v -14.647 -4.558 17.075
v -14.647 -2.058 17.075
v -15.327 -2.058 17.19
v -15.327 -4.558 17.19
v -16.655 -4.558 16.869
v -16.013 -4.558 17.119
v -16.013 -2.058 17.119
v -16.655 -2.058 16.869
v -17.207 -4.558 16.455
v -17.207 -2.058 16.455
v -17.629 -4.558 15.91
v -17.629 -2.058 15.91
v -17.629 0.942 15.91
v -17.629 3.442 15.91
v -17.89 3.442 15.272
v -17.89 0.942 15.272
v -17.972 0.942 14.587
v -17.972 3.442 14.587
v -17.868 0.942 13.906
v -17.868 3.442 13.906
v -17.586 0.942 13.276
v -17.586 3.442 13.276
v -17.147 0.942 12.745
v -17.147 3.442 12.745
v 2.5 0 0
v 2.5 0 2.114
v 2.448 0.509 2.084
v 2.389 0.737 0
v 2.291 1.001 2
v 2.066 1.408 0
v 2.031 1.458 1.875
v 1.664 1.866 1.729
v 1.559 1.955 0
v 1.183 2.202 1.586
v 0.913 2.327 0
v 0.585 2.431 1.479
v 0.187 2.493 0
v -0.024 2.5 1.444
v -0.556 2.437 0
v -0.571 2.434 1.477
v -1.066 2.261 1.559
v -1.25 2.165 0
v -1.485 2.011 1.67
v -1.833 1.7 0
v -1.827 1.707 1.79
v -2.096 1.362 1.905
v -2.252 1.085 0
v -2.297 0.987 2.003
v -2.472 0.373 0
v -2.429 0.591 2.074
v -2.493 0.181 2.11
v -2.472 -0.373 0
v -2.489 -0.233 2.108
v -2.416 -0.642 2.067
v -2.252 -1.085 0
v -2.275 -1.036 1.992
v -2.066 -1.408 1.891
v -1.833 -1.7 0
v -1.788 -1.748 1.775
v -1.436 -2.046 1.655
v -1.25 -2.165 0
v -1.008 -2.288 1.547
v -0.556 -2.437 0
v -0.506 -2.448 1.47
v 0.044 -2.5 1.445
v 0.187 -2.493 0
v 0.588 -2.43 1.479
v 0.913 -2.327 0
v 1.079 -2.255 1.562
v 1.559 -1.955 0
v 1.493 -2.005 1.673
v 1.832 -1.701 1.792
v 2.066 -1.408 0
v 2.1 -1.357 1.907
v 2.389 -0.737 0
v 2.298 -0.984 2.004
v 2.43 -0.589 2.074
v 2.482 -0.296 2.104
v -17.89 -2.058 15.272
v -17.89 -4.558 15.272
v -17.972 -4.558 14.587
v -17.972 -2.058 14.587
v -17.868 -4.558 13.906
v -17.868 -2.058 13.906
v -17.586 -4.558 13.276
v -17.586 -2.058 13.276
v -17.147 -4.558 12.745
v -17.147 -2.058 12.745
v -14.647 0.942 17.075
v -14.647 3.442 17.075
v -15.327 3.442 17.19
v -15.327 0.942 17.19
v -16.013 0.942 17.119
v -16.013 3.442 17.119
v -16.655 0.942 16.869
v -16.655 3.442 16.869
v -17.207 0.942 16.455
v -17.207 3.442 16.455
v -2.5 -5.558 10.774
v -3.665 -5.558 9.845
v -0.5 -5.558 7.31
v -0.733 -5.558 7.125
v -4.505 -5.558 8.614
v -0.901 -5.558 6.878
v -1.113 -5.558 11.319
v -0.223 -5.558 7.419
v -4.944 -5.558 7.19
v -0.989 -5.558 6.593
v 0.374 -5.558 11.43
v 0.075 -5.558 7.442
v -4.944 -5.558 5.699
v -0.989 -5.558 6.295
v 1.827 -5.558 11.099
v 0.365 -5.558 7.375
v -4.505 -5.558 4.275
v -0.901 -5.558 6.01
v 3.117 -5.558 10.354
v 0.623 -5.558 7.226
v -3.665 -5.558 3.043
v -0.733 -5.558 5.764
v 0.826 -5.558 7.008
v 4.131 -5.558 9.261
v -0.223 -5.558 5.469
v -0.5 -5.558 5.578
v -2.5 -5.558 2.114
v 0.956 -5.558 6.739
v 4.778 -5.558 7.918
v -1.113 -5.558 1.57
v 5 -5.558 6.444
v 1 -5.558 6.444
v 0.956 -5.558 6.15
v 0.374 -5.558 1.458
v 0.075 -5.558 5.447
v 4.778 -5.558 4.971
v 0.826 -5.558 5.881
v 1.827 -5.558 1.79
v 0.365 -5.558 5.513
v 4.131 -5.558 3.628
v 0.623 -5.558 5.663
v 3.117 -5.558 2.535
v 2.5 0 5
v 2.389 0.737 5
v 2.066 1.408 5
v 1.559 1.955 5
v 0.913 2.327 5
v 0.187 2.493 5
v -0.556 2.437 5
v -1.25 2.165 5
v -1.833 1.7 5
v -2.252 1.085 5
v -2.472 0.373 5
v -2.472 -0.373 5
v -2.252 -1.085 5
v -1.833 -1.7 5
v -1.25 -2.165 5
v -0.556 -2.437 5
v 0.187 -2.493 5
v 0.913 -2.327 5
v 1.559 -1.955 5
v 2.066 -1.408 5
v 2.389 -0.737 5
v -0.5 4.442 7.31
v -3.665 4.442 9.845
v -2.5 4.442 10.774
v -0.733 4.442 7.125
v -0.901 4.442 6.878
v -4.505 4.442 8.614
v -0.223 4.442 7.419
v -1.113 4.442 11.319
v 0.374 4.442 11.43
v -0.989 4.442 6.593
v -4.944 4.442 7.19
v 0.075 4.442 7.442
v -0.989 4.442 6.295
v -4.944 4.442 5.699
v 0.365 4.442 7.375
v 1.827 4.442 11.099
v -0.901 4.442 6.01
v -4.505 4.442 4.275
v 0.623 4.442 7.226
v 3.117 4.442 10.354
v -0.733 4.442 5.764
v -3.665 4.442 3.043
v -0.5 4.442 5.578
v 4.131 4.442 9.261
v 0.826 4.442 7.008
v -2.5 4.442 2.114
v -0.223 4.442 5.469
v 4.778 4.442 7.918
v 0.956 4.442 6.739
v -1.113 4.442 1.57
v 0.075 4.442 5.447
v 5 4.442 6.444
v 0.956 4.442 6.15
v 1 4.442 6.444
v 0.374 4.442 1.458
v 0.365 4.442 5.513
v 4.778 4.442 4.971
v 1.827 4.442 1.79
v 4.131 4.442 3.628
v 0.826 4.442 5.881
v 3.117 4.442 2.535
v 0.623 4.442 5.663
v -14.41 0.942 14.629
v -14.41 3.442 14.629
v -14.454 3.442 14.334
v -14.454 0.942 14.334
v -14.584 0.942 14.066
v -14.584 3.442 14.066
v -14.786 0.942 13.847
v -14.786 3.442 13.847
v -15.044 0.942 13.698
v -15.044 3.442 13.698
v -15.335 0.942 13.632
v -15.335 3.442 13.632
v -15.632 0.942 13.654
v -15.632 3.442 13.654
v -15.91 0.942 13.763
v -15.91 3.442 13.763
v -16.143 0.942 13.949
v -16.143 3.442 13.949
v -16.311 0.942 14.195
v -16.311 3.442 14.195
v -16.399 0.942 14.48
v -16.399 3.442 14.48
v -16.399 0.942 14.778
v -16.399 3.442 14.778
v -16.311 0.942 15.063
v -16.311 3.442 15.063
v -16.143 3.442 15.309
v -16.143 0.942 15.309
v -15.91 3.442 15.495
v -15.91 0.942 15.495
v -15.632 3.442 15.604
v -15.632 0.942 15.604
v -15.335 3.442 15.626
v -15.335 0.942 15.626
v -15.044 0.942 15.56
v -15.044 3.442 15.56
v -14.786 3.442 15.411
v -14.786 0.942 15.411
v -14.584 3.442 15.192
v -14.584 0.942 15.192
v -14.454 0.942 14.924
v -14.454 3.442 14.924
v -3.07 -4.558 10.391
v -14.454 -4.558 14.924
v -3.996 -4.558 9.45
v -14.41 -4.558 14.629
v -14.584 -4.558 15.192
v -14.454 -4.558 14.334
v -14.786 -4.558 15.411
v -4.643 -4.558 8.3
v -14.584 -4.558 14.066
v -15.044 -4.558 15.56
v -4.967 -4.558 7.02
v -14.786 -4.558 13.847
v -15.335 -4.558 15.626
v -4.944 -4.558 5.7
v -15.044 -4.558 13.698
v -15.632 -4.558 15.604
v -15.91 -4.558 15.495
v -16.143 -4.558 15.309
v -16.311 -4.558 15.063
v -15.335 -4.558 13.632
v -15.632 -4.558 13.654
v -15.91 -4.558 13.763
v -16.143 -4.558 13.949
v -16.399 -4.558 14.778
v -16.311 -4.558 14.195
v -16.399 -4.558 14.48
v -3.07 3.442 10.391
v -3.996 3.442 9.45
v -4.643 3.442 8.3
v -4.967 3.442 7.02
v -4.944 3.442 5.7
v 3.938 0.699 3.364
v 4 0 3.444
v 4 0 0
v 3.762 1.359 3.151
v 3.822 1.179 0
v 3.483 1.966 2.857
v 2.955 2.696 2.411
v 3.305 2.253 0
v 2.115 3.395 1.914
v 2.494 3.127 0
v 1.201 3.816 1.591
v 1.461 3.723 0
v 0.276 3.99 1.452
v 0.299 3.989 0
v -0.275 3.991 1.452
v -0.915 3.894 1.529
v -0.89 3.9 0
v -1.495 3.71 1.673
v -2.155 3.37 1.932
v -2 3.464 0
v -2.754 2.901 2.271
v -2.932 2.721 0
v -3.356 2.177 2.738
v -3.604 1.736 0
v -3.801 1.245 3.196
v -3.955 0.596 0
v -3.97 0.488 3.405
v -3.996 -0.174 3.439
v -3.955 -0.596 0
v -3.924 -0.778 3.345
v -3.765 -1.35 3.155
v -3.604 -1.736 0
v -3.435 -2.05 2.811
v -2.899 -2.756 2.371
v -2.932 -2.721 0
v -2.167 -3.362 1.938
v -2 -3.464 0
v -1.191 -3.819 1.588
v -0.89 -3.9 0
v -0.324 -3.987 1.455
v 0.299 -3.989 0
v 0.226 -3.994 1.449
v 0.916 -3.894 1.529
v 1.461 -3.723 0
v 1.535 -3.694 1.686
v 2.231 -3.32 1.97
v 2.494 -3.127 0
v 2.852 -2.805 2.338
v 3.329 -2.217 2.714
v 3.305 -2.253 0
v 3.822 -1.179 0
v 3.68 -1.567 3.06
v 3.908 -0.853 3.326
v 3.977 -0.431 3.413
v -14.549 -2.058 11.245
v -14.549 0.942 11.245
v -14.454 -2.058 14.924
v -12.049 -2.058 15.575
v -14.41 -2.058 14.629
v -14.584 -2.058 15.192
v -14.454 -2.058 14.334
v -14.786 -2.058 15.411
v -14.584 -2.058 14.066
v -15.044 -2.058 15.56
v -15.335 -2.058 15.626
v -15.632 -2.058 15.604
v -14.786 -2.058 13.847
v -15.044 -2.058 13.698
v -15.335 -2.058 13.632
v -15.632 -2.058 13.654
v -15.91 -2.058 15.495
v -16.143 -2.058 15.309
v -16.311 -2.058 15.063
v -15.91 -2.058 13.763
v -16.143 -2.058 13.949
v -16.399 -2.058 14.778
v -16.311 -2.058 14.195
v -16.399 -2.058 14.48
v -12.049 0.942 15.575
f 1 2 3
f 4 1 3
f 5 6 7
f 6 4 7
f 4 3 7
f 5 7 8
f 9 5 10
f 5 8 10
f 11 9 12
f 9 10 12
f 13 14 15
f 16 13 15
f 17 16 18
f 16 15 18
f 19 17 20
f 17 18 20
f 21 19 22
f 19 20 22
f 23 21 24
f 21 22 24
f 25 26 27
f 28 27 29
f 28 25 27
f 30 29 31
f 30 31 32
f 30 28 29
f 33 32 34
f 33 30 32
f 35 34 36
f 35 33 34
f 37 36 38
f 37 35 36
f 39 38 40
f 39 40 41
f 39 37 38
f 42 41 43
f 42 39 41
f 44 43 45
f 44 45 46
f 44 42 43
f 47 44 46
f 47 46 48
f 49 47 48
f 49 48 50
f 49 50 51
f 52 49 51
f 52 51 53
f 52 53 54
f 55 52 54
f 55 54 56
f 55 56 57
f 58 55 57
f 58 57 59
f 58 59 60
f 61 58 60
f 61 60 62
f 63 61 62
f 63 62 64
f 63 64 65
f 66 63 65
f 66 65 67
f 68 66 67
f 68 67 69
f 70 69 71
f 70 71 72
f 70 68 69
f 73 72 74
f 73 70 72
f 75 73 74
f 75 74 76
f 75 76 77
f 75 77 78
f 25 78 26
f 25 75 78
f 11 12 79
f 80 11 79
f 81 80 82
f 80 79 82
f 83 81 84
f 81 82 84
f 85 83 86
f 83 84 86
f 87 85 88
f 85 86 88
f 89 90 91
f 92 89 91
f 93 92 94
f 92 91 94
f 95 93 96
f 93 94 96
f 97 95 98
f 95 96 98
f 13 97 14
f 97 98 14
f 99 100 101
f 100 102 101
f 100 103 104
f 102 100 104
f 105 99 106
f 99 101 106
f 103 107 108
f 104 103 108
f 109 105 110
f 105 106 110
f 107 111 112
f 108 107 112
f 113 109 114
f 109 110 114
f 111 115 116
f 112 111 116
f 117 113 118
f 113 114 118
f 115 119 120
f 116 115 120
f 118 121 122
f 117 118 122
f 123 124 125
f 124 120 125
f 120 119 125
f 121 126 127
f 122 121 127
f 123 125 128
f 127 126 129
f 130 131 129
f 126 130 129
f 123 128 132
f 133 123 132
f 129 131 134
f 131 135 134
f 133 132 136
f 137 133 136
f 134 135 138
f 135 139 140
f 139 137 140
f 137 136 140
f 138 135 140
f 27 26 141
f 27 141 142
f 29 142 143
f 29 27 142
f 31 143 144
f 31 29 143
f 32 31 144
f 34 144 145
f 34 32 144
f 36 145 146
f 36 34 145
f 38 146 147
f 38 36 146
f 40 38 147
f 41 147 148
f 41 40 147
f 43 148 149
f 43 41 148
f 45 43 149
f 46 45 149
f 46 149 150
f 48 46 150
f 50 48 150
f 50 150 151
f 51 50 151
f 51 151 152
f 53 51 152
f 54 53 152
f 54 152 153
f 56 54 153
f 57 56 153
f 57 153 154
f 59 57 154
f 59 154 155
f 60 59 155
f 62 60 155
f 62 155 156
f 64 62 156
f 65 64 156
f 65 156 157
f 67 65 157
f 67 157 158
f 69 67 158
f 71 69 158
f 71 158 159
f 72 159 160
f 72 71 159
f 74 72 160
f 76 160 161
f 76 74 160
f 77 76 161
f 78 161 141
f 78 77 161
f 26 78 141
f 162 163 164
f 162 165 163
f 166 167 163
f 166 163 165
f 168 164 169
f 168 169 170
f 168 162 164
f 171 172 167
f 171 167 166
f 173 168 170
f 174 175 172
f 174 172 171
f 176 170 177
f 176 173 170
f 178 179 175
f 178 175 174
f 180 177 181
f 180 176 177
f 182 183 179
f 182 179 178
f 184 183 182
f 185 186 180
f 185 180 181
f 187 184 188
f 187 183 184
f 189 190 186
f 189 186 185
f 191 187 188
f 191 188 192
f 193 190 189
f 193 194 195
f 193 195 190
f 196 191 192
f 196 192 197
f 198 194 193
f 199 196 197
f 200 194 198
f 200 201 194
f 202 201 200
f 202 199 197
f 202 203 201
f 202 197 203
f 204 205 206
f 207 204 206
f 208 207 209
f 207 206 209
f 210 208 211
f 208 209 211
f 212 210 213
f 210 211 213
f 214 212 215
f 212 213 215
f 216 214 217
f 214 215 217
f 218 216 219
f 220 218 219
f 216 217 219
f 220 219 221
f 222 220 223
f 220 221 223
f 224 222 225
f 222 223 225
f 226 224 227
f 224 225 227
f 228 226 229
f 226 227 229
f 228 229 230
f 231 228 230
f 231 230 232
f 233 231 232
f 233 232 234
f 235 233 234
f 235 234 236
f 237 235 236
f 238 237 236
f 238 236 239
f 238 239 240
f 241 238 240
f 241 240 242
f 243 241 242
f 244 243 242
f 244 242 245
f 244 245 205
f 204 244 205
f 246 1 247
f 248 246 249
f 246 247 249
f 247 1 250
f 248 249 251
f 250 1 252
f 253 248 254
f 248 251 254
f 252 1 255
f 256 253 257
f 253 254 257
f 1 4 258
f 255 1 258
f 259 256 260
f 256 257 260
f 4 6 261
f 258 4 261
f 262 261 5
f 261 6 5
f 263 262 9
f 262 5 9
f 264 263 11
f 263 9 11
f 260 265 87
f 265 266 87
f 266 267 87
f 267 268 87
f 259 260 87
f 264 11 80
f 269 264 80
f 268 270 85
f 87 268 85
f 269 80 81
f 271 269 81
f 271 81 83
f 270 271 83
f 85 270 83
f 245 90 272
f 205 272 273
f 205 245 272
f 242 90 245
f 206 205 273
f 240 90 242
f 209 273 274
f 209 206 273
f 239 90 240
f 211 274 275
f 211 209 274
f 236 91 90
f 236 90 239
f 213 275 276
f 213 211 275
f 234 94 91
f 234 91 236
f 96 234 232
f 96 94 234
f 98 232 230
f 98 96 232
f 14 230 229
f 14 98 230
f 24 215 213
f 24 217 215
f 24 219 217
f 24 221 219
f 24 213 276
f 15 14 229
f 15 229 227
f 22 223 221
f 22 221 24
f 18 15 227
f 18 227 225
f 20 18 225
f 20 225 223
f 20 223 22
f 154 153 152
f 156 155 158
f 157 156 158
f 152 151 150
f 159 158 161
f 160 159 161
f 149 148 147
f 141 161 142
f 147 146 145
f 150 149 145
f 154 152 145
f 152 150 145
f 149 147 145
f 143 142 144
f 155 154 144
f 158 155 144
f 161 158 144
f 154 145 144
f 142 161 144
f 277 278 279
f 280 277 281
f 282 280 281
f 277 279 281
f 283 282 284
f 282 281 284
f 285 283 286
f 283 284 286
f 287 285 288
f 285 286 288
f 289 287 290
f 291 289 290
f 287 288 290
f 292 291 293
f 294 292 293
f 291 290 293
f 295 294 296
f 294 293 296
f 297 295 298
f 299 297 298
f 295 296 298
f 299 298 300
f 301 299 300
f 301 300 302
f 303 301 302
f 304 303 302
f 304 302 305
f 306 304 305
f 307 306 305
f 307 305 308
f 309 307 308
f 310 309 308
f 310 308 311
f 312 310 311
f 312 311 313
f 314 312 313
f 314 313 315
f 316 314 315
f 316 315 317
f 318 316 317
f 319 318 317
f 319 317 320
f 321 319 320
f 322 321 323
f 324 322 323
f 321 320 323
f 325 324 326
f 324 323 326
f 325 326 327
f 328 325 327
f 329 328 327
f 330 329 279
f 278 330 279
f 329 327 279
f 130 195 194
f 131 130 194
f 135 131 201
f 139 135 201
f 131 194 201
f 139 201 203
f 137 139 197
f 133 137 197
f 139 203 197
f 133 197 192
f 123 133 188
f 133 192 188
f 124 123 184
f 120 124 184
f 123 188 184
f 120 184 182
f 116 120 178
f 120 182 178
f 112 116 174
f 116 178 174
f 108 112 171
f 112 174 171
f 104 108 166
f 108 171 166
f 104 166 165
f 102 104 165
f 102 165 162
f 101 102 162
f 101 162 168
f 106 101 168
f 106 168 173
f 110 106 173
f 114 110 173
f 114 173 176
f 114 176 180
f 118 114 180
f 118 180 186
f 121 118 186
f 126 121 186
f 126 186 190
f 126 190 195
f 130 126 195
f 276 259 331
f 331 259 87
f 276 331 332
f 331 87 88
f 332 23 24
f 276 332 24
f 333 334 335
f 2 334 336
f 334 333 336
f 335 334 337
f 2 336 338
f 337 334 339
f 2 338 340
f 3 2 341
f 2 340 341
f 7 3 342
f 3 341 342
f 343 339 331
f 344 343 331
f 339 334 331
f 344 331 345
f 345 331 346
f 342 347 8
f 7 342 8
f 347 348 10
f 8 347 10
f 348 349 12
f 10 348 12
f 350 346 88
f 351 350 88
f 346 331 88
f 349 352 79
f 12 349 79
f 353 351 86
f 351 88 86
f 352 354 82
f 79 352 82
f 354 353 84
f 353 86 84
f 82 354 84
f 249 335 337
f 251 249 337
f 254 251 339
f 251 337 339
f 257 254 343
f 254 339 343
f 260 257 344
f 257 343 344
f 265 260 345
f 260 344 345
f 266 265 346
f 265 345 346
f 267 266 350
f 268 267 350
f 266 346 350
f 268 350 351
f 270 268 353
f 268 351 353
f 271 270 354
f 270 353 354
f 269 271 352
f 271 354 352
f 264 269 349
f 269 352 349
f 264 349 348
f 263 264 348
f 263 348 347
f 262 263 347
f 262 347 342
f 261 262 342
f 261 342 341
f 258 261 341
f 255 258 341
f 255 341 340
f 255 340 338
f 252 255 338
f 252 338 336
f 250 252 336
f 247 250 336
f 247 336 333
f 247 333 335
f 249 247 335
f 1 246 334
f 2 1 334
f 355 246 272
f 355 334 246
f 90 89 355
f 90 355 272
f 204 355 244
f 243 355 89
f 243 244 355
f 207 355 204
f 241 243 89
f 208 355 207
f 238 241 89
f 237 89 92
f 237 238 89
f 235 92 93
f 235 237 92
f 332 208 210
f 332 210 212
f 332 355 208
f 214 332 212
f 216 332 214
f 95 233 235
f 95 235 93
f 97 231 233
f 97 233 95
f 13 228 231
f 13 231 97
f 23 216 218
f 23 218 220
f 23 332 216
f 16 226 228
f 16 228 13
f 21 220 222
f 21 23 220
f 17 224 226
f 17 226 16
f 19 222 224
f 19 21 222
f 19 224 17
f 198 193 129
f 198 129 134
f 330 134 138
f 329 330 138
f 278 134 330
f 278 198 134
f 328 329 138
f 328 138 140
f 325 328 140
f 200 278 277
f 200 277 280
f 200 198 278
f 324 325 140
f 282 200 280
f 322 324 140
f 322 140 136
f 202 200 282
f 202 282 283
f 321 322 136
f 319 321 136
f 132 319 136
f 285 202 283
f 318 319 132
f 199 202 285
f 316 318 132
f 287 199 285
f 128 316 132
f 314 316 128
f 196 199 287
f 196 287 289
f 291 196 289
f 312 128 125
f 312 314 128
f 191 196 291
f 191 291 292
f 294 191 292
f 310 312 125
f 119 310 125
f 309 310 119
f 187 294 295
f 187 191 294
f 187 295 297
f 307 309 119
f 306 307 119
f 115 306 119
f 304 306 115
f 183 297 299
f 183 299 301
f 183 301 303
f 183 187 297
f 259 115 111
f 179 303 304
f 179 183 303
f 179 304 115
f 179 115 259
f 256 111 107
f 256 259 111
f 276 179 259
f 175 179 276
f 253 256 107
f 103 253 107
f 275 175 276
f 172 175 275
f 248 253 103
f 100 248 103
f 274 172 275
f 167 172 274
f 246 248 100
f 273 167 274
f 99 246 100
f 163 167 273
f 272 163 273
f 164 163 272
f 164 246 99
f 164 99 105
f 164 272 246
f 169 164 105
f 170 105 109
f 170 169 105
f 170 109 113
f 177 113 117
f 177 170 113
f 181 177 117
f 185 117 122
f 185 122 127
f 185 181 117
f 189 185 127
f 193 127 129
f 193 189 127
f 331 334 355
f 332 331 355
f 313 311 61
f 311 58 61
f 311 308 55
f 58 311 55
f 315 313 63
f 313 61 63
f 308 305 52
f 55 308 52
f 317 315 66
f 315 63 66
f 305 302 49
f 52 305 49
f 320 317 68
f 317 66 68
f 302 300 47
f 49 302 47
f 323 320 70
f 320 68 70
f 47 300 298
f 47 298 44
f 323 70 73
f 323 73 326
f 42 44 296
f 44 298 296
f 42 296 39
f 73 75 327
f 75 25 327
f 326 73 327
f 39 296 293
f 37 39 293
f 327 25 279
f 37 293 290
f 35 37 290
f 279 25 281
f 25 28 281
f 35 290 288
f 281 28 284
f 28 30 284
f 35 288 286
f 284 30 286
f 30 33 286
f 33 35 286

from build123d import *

# Parameters (mm, degrees)
SKETCH2_R                       = 4
SKETCH2_R_2                     = 2.5
BOSS_EXTRUDE1_DEPTH             = 4
SKETCH4_R                       = 5
BOSS_EXTRUDE2_DEPTH             = 10
SKETCH5_R                       = 2.5
CUT_EXTRUDE1_DEPTH              = 5
SKETCH6_R                       = 1
CUT_EXTRUDE2_DEPTH              = 11.0000001
SKETCH7_W                       = 8
SKETCH7_H                       = 5
BOSS_EXTRUDE3_DEPTH             = 15
BOSS_EXTRUDE3_DIRECTION_2_REACH = 14.552
SKETCH10_W                      = 5
SKETCH10_H                      = 3
CUT_EXTRUDE4_DEPTH              = 20
SKETCH9_R                       = 1
CUT_EXTRUDE6_DEPTH              = 20


with BuildPart() as part:
    # Sketch2 → Boss-Extrude1 (new body)
    with BuildSketch(Plane.XY):
        Circle(SKETCH2_R)
        Circle(SKETCH2_R_2, mode=Mode.SUBTRACT)
    extrude(amount=BOSS_EXTRUDE1_DEPTH)

    # Sketch4 → Boss-Extrude2 (add)
    with BuildSketch(Plane(origin=(0, 4.441770998, 4), x_dir=(1, 0, 0), z_dir=(0, 1, 0))):
        with Locations((0, -2.444351266)):
            Circle(SKETCH4_R)
    extrude(amount=-BOSS_EXTRUDE2_DEPTH)

    # Sketch5 → Cut-Extrude1 (cut)
    with BuildSketch(Plane.XY):
        Circle(SKETCH5_R)
    extrude(amount=CUT_EXTRUDE1_DEPTH, mode=Mode.SUBTRACT)

    # Sketch6 → Cut-Extrude2 (cut, through all)
    with BuildSketch(Plane(origin=(0, 4.441770998, 0), x_dir=(1, 0, 0), z_dir=(0, 1, 0))):
        with Locations((0, -6.444351266)):
            Circle(SKETCH6_R)
    extrude(amount=-CUT_EXTRUDE2_DEPTH, mode=Mode.SUBTRACT)

    # Sketch7 → Boss-Extrude3 (add)
    with BuildSketch(Plane(origin=(-7.120612972, 0, 4.111087816), x_dir=(0, 1, 0), z_dir=(-0.866025404, 0, 0.5))):
        with Locations((-0.558229002, -4.964101615)):
            Rectangle(SKETCH7_W, SKETCH7_H)
    extrude(amount=BOSS_EXTRUDE3_DEPTH)

    # Sketch7 → Boss-Extrude3 direction 2 (add, up to next)
    with BuildSketch(Plane(origin=(-7.120612972, 0, 4.111087816), x_dir=(0, 1, 0), z_dir=(-0.866025404, 0, 0.5)), mode=Mode.PRIVATE) as boss_extrude3_direction_2_sk1:
        with Locations((-0.558229002, -4.964101615)):
            Rectangle(SKETCH7_W, SKETCH7_H)
    boss_extrude3_direction_2_tool1 = extrude(boss_extrude3_direction_2_sk1.sketch, amount=-BOSS_EXTRUDE3_DIRECTION_2_REACH, mode=Mode.PRIVATE) - part.part
    add(boss_extrude3_direction_2_tool1.solids().sort_by_distance((-4.638562, -0.558229, 8.410126))[0])
    add(boss_extrude3_direction_2_tool1.solids().sort_by_distance((-4.638562, -0.558229, 8.410126))[1])

    # Sketch10 → Cut-Extrude4 (cut)
    with BuildSketch(Plane(origin=(1.232050808, 0, 2.133974596), x_dir=(-0.866025404, 0, 0.5), z_dir=(-0.5, 0, -0.866025404))):
        with Locations((20.722175633, -0.558229002)):
            Rectangle(SKETCH10_W, SKETCH10_H)
    extrude(amount=-CUT_EXTRUDE4_DEPTH, mode=Mode.SUBTRACT)

    # Sketch9 → Cut-Extrude6 (cut)
    with BuildSketch(Plane(origin=(0, 3.441770998, 0), x_dir=(1, 0, 0), z_dir=(0, 1, 0))):
        with BuildLine():
            Line((-18.878943222, -13.745062413), (-17.628943256, -15.910125863))
            ThreePointArc((-17.628943256, -15.910125863), (-17.943039978, -14.243046987), (-17.146892414, -12.745062413))
            Line((-17.146892414, -12.745062413), (-18.878943222, -13.745062413))
        make_face()
        with BuildLine():
            Line((-17.628943256, -15.910125863), (-16.378943222, -18.075189432))
            Line((-16.378943222, -18.075189432), (-14.646892414, -17.075189432))
            ThreePointArc((-14.646892414, -17.075189432), (-16.342258956, -17.015681135), (-17.628943256, -15.910125863))
        make_face()
        with Locations((-15.409753124, -14.628875922)):
            Circle(SKETCH9_R)
    extrude(amount=-CUT_EXTRUDE6_DEPTH, mode=Mode.SUBTRACT)


solid = part.part
